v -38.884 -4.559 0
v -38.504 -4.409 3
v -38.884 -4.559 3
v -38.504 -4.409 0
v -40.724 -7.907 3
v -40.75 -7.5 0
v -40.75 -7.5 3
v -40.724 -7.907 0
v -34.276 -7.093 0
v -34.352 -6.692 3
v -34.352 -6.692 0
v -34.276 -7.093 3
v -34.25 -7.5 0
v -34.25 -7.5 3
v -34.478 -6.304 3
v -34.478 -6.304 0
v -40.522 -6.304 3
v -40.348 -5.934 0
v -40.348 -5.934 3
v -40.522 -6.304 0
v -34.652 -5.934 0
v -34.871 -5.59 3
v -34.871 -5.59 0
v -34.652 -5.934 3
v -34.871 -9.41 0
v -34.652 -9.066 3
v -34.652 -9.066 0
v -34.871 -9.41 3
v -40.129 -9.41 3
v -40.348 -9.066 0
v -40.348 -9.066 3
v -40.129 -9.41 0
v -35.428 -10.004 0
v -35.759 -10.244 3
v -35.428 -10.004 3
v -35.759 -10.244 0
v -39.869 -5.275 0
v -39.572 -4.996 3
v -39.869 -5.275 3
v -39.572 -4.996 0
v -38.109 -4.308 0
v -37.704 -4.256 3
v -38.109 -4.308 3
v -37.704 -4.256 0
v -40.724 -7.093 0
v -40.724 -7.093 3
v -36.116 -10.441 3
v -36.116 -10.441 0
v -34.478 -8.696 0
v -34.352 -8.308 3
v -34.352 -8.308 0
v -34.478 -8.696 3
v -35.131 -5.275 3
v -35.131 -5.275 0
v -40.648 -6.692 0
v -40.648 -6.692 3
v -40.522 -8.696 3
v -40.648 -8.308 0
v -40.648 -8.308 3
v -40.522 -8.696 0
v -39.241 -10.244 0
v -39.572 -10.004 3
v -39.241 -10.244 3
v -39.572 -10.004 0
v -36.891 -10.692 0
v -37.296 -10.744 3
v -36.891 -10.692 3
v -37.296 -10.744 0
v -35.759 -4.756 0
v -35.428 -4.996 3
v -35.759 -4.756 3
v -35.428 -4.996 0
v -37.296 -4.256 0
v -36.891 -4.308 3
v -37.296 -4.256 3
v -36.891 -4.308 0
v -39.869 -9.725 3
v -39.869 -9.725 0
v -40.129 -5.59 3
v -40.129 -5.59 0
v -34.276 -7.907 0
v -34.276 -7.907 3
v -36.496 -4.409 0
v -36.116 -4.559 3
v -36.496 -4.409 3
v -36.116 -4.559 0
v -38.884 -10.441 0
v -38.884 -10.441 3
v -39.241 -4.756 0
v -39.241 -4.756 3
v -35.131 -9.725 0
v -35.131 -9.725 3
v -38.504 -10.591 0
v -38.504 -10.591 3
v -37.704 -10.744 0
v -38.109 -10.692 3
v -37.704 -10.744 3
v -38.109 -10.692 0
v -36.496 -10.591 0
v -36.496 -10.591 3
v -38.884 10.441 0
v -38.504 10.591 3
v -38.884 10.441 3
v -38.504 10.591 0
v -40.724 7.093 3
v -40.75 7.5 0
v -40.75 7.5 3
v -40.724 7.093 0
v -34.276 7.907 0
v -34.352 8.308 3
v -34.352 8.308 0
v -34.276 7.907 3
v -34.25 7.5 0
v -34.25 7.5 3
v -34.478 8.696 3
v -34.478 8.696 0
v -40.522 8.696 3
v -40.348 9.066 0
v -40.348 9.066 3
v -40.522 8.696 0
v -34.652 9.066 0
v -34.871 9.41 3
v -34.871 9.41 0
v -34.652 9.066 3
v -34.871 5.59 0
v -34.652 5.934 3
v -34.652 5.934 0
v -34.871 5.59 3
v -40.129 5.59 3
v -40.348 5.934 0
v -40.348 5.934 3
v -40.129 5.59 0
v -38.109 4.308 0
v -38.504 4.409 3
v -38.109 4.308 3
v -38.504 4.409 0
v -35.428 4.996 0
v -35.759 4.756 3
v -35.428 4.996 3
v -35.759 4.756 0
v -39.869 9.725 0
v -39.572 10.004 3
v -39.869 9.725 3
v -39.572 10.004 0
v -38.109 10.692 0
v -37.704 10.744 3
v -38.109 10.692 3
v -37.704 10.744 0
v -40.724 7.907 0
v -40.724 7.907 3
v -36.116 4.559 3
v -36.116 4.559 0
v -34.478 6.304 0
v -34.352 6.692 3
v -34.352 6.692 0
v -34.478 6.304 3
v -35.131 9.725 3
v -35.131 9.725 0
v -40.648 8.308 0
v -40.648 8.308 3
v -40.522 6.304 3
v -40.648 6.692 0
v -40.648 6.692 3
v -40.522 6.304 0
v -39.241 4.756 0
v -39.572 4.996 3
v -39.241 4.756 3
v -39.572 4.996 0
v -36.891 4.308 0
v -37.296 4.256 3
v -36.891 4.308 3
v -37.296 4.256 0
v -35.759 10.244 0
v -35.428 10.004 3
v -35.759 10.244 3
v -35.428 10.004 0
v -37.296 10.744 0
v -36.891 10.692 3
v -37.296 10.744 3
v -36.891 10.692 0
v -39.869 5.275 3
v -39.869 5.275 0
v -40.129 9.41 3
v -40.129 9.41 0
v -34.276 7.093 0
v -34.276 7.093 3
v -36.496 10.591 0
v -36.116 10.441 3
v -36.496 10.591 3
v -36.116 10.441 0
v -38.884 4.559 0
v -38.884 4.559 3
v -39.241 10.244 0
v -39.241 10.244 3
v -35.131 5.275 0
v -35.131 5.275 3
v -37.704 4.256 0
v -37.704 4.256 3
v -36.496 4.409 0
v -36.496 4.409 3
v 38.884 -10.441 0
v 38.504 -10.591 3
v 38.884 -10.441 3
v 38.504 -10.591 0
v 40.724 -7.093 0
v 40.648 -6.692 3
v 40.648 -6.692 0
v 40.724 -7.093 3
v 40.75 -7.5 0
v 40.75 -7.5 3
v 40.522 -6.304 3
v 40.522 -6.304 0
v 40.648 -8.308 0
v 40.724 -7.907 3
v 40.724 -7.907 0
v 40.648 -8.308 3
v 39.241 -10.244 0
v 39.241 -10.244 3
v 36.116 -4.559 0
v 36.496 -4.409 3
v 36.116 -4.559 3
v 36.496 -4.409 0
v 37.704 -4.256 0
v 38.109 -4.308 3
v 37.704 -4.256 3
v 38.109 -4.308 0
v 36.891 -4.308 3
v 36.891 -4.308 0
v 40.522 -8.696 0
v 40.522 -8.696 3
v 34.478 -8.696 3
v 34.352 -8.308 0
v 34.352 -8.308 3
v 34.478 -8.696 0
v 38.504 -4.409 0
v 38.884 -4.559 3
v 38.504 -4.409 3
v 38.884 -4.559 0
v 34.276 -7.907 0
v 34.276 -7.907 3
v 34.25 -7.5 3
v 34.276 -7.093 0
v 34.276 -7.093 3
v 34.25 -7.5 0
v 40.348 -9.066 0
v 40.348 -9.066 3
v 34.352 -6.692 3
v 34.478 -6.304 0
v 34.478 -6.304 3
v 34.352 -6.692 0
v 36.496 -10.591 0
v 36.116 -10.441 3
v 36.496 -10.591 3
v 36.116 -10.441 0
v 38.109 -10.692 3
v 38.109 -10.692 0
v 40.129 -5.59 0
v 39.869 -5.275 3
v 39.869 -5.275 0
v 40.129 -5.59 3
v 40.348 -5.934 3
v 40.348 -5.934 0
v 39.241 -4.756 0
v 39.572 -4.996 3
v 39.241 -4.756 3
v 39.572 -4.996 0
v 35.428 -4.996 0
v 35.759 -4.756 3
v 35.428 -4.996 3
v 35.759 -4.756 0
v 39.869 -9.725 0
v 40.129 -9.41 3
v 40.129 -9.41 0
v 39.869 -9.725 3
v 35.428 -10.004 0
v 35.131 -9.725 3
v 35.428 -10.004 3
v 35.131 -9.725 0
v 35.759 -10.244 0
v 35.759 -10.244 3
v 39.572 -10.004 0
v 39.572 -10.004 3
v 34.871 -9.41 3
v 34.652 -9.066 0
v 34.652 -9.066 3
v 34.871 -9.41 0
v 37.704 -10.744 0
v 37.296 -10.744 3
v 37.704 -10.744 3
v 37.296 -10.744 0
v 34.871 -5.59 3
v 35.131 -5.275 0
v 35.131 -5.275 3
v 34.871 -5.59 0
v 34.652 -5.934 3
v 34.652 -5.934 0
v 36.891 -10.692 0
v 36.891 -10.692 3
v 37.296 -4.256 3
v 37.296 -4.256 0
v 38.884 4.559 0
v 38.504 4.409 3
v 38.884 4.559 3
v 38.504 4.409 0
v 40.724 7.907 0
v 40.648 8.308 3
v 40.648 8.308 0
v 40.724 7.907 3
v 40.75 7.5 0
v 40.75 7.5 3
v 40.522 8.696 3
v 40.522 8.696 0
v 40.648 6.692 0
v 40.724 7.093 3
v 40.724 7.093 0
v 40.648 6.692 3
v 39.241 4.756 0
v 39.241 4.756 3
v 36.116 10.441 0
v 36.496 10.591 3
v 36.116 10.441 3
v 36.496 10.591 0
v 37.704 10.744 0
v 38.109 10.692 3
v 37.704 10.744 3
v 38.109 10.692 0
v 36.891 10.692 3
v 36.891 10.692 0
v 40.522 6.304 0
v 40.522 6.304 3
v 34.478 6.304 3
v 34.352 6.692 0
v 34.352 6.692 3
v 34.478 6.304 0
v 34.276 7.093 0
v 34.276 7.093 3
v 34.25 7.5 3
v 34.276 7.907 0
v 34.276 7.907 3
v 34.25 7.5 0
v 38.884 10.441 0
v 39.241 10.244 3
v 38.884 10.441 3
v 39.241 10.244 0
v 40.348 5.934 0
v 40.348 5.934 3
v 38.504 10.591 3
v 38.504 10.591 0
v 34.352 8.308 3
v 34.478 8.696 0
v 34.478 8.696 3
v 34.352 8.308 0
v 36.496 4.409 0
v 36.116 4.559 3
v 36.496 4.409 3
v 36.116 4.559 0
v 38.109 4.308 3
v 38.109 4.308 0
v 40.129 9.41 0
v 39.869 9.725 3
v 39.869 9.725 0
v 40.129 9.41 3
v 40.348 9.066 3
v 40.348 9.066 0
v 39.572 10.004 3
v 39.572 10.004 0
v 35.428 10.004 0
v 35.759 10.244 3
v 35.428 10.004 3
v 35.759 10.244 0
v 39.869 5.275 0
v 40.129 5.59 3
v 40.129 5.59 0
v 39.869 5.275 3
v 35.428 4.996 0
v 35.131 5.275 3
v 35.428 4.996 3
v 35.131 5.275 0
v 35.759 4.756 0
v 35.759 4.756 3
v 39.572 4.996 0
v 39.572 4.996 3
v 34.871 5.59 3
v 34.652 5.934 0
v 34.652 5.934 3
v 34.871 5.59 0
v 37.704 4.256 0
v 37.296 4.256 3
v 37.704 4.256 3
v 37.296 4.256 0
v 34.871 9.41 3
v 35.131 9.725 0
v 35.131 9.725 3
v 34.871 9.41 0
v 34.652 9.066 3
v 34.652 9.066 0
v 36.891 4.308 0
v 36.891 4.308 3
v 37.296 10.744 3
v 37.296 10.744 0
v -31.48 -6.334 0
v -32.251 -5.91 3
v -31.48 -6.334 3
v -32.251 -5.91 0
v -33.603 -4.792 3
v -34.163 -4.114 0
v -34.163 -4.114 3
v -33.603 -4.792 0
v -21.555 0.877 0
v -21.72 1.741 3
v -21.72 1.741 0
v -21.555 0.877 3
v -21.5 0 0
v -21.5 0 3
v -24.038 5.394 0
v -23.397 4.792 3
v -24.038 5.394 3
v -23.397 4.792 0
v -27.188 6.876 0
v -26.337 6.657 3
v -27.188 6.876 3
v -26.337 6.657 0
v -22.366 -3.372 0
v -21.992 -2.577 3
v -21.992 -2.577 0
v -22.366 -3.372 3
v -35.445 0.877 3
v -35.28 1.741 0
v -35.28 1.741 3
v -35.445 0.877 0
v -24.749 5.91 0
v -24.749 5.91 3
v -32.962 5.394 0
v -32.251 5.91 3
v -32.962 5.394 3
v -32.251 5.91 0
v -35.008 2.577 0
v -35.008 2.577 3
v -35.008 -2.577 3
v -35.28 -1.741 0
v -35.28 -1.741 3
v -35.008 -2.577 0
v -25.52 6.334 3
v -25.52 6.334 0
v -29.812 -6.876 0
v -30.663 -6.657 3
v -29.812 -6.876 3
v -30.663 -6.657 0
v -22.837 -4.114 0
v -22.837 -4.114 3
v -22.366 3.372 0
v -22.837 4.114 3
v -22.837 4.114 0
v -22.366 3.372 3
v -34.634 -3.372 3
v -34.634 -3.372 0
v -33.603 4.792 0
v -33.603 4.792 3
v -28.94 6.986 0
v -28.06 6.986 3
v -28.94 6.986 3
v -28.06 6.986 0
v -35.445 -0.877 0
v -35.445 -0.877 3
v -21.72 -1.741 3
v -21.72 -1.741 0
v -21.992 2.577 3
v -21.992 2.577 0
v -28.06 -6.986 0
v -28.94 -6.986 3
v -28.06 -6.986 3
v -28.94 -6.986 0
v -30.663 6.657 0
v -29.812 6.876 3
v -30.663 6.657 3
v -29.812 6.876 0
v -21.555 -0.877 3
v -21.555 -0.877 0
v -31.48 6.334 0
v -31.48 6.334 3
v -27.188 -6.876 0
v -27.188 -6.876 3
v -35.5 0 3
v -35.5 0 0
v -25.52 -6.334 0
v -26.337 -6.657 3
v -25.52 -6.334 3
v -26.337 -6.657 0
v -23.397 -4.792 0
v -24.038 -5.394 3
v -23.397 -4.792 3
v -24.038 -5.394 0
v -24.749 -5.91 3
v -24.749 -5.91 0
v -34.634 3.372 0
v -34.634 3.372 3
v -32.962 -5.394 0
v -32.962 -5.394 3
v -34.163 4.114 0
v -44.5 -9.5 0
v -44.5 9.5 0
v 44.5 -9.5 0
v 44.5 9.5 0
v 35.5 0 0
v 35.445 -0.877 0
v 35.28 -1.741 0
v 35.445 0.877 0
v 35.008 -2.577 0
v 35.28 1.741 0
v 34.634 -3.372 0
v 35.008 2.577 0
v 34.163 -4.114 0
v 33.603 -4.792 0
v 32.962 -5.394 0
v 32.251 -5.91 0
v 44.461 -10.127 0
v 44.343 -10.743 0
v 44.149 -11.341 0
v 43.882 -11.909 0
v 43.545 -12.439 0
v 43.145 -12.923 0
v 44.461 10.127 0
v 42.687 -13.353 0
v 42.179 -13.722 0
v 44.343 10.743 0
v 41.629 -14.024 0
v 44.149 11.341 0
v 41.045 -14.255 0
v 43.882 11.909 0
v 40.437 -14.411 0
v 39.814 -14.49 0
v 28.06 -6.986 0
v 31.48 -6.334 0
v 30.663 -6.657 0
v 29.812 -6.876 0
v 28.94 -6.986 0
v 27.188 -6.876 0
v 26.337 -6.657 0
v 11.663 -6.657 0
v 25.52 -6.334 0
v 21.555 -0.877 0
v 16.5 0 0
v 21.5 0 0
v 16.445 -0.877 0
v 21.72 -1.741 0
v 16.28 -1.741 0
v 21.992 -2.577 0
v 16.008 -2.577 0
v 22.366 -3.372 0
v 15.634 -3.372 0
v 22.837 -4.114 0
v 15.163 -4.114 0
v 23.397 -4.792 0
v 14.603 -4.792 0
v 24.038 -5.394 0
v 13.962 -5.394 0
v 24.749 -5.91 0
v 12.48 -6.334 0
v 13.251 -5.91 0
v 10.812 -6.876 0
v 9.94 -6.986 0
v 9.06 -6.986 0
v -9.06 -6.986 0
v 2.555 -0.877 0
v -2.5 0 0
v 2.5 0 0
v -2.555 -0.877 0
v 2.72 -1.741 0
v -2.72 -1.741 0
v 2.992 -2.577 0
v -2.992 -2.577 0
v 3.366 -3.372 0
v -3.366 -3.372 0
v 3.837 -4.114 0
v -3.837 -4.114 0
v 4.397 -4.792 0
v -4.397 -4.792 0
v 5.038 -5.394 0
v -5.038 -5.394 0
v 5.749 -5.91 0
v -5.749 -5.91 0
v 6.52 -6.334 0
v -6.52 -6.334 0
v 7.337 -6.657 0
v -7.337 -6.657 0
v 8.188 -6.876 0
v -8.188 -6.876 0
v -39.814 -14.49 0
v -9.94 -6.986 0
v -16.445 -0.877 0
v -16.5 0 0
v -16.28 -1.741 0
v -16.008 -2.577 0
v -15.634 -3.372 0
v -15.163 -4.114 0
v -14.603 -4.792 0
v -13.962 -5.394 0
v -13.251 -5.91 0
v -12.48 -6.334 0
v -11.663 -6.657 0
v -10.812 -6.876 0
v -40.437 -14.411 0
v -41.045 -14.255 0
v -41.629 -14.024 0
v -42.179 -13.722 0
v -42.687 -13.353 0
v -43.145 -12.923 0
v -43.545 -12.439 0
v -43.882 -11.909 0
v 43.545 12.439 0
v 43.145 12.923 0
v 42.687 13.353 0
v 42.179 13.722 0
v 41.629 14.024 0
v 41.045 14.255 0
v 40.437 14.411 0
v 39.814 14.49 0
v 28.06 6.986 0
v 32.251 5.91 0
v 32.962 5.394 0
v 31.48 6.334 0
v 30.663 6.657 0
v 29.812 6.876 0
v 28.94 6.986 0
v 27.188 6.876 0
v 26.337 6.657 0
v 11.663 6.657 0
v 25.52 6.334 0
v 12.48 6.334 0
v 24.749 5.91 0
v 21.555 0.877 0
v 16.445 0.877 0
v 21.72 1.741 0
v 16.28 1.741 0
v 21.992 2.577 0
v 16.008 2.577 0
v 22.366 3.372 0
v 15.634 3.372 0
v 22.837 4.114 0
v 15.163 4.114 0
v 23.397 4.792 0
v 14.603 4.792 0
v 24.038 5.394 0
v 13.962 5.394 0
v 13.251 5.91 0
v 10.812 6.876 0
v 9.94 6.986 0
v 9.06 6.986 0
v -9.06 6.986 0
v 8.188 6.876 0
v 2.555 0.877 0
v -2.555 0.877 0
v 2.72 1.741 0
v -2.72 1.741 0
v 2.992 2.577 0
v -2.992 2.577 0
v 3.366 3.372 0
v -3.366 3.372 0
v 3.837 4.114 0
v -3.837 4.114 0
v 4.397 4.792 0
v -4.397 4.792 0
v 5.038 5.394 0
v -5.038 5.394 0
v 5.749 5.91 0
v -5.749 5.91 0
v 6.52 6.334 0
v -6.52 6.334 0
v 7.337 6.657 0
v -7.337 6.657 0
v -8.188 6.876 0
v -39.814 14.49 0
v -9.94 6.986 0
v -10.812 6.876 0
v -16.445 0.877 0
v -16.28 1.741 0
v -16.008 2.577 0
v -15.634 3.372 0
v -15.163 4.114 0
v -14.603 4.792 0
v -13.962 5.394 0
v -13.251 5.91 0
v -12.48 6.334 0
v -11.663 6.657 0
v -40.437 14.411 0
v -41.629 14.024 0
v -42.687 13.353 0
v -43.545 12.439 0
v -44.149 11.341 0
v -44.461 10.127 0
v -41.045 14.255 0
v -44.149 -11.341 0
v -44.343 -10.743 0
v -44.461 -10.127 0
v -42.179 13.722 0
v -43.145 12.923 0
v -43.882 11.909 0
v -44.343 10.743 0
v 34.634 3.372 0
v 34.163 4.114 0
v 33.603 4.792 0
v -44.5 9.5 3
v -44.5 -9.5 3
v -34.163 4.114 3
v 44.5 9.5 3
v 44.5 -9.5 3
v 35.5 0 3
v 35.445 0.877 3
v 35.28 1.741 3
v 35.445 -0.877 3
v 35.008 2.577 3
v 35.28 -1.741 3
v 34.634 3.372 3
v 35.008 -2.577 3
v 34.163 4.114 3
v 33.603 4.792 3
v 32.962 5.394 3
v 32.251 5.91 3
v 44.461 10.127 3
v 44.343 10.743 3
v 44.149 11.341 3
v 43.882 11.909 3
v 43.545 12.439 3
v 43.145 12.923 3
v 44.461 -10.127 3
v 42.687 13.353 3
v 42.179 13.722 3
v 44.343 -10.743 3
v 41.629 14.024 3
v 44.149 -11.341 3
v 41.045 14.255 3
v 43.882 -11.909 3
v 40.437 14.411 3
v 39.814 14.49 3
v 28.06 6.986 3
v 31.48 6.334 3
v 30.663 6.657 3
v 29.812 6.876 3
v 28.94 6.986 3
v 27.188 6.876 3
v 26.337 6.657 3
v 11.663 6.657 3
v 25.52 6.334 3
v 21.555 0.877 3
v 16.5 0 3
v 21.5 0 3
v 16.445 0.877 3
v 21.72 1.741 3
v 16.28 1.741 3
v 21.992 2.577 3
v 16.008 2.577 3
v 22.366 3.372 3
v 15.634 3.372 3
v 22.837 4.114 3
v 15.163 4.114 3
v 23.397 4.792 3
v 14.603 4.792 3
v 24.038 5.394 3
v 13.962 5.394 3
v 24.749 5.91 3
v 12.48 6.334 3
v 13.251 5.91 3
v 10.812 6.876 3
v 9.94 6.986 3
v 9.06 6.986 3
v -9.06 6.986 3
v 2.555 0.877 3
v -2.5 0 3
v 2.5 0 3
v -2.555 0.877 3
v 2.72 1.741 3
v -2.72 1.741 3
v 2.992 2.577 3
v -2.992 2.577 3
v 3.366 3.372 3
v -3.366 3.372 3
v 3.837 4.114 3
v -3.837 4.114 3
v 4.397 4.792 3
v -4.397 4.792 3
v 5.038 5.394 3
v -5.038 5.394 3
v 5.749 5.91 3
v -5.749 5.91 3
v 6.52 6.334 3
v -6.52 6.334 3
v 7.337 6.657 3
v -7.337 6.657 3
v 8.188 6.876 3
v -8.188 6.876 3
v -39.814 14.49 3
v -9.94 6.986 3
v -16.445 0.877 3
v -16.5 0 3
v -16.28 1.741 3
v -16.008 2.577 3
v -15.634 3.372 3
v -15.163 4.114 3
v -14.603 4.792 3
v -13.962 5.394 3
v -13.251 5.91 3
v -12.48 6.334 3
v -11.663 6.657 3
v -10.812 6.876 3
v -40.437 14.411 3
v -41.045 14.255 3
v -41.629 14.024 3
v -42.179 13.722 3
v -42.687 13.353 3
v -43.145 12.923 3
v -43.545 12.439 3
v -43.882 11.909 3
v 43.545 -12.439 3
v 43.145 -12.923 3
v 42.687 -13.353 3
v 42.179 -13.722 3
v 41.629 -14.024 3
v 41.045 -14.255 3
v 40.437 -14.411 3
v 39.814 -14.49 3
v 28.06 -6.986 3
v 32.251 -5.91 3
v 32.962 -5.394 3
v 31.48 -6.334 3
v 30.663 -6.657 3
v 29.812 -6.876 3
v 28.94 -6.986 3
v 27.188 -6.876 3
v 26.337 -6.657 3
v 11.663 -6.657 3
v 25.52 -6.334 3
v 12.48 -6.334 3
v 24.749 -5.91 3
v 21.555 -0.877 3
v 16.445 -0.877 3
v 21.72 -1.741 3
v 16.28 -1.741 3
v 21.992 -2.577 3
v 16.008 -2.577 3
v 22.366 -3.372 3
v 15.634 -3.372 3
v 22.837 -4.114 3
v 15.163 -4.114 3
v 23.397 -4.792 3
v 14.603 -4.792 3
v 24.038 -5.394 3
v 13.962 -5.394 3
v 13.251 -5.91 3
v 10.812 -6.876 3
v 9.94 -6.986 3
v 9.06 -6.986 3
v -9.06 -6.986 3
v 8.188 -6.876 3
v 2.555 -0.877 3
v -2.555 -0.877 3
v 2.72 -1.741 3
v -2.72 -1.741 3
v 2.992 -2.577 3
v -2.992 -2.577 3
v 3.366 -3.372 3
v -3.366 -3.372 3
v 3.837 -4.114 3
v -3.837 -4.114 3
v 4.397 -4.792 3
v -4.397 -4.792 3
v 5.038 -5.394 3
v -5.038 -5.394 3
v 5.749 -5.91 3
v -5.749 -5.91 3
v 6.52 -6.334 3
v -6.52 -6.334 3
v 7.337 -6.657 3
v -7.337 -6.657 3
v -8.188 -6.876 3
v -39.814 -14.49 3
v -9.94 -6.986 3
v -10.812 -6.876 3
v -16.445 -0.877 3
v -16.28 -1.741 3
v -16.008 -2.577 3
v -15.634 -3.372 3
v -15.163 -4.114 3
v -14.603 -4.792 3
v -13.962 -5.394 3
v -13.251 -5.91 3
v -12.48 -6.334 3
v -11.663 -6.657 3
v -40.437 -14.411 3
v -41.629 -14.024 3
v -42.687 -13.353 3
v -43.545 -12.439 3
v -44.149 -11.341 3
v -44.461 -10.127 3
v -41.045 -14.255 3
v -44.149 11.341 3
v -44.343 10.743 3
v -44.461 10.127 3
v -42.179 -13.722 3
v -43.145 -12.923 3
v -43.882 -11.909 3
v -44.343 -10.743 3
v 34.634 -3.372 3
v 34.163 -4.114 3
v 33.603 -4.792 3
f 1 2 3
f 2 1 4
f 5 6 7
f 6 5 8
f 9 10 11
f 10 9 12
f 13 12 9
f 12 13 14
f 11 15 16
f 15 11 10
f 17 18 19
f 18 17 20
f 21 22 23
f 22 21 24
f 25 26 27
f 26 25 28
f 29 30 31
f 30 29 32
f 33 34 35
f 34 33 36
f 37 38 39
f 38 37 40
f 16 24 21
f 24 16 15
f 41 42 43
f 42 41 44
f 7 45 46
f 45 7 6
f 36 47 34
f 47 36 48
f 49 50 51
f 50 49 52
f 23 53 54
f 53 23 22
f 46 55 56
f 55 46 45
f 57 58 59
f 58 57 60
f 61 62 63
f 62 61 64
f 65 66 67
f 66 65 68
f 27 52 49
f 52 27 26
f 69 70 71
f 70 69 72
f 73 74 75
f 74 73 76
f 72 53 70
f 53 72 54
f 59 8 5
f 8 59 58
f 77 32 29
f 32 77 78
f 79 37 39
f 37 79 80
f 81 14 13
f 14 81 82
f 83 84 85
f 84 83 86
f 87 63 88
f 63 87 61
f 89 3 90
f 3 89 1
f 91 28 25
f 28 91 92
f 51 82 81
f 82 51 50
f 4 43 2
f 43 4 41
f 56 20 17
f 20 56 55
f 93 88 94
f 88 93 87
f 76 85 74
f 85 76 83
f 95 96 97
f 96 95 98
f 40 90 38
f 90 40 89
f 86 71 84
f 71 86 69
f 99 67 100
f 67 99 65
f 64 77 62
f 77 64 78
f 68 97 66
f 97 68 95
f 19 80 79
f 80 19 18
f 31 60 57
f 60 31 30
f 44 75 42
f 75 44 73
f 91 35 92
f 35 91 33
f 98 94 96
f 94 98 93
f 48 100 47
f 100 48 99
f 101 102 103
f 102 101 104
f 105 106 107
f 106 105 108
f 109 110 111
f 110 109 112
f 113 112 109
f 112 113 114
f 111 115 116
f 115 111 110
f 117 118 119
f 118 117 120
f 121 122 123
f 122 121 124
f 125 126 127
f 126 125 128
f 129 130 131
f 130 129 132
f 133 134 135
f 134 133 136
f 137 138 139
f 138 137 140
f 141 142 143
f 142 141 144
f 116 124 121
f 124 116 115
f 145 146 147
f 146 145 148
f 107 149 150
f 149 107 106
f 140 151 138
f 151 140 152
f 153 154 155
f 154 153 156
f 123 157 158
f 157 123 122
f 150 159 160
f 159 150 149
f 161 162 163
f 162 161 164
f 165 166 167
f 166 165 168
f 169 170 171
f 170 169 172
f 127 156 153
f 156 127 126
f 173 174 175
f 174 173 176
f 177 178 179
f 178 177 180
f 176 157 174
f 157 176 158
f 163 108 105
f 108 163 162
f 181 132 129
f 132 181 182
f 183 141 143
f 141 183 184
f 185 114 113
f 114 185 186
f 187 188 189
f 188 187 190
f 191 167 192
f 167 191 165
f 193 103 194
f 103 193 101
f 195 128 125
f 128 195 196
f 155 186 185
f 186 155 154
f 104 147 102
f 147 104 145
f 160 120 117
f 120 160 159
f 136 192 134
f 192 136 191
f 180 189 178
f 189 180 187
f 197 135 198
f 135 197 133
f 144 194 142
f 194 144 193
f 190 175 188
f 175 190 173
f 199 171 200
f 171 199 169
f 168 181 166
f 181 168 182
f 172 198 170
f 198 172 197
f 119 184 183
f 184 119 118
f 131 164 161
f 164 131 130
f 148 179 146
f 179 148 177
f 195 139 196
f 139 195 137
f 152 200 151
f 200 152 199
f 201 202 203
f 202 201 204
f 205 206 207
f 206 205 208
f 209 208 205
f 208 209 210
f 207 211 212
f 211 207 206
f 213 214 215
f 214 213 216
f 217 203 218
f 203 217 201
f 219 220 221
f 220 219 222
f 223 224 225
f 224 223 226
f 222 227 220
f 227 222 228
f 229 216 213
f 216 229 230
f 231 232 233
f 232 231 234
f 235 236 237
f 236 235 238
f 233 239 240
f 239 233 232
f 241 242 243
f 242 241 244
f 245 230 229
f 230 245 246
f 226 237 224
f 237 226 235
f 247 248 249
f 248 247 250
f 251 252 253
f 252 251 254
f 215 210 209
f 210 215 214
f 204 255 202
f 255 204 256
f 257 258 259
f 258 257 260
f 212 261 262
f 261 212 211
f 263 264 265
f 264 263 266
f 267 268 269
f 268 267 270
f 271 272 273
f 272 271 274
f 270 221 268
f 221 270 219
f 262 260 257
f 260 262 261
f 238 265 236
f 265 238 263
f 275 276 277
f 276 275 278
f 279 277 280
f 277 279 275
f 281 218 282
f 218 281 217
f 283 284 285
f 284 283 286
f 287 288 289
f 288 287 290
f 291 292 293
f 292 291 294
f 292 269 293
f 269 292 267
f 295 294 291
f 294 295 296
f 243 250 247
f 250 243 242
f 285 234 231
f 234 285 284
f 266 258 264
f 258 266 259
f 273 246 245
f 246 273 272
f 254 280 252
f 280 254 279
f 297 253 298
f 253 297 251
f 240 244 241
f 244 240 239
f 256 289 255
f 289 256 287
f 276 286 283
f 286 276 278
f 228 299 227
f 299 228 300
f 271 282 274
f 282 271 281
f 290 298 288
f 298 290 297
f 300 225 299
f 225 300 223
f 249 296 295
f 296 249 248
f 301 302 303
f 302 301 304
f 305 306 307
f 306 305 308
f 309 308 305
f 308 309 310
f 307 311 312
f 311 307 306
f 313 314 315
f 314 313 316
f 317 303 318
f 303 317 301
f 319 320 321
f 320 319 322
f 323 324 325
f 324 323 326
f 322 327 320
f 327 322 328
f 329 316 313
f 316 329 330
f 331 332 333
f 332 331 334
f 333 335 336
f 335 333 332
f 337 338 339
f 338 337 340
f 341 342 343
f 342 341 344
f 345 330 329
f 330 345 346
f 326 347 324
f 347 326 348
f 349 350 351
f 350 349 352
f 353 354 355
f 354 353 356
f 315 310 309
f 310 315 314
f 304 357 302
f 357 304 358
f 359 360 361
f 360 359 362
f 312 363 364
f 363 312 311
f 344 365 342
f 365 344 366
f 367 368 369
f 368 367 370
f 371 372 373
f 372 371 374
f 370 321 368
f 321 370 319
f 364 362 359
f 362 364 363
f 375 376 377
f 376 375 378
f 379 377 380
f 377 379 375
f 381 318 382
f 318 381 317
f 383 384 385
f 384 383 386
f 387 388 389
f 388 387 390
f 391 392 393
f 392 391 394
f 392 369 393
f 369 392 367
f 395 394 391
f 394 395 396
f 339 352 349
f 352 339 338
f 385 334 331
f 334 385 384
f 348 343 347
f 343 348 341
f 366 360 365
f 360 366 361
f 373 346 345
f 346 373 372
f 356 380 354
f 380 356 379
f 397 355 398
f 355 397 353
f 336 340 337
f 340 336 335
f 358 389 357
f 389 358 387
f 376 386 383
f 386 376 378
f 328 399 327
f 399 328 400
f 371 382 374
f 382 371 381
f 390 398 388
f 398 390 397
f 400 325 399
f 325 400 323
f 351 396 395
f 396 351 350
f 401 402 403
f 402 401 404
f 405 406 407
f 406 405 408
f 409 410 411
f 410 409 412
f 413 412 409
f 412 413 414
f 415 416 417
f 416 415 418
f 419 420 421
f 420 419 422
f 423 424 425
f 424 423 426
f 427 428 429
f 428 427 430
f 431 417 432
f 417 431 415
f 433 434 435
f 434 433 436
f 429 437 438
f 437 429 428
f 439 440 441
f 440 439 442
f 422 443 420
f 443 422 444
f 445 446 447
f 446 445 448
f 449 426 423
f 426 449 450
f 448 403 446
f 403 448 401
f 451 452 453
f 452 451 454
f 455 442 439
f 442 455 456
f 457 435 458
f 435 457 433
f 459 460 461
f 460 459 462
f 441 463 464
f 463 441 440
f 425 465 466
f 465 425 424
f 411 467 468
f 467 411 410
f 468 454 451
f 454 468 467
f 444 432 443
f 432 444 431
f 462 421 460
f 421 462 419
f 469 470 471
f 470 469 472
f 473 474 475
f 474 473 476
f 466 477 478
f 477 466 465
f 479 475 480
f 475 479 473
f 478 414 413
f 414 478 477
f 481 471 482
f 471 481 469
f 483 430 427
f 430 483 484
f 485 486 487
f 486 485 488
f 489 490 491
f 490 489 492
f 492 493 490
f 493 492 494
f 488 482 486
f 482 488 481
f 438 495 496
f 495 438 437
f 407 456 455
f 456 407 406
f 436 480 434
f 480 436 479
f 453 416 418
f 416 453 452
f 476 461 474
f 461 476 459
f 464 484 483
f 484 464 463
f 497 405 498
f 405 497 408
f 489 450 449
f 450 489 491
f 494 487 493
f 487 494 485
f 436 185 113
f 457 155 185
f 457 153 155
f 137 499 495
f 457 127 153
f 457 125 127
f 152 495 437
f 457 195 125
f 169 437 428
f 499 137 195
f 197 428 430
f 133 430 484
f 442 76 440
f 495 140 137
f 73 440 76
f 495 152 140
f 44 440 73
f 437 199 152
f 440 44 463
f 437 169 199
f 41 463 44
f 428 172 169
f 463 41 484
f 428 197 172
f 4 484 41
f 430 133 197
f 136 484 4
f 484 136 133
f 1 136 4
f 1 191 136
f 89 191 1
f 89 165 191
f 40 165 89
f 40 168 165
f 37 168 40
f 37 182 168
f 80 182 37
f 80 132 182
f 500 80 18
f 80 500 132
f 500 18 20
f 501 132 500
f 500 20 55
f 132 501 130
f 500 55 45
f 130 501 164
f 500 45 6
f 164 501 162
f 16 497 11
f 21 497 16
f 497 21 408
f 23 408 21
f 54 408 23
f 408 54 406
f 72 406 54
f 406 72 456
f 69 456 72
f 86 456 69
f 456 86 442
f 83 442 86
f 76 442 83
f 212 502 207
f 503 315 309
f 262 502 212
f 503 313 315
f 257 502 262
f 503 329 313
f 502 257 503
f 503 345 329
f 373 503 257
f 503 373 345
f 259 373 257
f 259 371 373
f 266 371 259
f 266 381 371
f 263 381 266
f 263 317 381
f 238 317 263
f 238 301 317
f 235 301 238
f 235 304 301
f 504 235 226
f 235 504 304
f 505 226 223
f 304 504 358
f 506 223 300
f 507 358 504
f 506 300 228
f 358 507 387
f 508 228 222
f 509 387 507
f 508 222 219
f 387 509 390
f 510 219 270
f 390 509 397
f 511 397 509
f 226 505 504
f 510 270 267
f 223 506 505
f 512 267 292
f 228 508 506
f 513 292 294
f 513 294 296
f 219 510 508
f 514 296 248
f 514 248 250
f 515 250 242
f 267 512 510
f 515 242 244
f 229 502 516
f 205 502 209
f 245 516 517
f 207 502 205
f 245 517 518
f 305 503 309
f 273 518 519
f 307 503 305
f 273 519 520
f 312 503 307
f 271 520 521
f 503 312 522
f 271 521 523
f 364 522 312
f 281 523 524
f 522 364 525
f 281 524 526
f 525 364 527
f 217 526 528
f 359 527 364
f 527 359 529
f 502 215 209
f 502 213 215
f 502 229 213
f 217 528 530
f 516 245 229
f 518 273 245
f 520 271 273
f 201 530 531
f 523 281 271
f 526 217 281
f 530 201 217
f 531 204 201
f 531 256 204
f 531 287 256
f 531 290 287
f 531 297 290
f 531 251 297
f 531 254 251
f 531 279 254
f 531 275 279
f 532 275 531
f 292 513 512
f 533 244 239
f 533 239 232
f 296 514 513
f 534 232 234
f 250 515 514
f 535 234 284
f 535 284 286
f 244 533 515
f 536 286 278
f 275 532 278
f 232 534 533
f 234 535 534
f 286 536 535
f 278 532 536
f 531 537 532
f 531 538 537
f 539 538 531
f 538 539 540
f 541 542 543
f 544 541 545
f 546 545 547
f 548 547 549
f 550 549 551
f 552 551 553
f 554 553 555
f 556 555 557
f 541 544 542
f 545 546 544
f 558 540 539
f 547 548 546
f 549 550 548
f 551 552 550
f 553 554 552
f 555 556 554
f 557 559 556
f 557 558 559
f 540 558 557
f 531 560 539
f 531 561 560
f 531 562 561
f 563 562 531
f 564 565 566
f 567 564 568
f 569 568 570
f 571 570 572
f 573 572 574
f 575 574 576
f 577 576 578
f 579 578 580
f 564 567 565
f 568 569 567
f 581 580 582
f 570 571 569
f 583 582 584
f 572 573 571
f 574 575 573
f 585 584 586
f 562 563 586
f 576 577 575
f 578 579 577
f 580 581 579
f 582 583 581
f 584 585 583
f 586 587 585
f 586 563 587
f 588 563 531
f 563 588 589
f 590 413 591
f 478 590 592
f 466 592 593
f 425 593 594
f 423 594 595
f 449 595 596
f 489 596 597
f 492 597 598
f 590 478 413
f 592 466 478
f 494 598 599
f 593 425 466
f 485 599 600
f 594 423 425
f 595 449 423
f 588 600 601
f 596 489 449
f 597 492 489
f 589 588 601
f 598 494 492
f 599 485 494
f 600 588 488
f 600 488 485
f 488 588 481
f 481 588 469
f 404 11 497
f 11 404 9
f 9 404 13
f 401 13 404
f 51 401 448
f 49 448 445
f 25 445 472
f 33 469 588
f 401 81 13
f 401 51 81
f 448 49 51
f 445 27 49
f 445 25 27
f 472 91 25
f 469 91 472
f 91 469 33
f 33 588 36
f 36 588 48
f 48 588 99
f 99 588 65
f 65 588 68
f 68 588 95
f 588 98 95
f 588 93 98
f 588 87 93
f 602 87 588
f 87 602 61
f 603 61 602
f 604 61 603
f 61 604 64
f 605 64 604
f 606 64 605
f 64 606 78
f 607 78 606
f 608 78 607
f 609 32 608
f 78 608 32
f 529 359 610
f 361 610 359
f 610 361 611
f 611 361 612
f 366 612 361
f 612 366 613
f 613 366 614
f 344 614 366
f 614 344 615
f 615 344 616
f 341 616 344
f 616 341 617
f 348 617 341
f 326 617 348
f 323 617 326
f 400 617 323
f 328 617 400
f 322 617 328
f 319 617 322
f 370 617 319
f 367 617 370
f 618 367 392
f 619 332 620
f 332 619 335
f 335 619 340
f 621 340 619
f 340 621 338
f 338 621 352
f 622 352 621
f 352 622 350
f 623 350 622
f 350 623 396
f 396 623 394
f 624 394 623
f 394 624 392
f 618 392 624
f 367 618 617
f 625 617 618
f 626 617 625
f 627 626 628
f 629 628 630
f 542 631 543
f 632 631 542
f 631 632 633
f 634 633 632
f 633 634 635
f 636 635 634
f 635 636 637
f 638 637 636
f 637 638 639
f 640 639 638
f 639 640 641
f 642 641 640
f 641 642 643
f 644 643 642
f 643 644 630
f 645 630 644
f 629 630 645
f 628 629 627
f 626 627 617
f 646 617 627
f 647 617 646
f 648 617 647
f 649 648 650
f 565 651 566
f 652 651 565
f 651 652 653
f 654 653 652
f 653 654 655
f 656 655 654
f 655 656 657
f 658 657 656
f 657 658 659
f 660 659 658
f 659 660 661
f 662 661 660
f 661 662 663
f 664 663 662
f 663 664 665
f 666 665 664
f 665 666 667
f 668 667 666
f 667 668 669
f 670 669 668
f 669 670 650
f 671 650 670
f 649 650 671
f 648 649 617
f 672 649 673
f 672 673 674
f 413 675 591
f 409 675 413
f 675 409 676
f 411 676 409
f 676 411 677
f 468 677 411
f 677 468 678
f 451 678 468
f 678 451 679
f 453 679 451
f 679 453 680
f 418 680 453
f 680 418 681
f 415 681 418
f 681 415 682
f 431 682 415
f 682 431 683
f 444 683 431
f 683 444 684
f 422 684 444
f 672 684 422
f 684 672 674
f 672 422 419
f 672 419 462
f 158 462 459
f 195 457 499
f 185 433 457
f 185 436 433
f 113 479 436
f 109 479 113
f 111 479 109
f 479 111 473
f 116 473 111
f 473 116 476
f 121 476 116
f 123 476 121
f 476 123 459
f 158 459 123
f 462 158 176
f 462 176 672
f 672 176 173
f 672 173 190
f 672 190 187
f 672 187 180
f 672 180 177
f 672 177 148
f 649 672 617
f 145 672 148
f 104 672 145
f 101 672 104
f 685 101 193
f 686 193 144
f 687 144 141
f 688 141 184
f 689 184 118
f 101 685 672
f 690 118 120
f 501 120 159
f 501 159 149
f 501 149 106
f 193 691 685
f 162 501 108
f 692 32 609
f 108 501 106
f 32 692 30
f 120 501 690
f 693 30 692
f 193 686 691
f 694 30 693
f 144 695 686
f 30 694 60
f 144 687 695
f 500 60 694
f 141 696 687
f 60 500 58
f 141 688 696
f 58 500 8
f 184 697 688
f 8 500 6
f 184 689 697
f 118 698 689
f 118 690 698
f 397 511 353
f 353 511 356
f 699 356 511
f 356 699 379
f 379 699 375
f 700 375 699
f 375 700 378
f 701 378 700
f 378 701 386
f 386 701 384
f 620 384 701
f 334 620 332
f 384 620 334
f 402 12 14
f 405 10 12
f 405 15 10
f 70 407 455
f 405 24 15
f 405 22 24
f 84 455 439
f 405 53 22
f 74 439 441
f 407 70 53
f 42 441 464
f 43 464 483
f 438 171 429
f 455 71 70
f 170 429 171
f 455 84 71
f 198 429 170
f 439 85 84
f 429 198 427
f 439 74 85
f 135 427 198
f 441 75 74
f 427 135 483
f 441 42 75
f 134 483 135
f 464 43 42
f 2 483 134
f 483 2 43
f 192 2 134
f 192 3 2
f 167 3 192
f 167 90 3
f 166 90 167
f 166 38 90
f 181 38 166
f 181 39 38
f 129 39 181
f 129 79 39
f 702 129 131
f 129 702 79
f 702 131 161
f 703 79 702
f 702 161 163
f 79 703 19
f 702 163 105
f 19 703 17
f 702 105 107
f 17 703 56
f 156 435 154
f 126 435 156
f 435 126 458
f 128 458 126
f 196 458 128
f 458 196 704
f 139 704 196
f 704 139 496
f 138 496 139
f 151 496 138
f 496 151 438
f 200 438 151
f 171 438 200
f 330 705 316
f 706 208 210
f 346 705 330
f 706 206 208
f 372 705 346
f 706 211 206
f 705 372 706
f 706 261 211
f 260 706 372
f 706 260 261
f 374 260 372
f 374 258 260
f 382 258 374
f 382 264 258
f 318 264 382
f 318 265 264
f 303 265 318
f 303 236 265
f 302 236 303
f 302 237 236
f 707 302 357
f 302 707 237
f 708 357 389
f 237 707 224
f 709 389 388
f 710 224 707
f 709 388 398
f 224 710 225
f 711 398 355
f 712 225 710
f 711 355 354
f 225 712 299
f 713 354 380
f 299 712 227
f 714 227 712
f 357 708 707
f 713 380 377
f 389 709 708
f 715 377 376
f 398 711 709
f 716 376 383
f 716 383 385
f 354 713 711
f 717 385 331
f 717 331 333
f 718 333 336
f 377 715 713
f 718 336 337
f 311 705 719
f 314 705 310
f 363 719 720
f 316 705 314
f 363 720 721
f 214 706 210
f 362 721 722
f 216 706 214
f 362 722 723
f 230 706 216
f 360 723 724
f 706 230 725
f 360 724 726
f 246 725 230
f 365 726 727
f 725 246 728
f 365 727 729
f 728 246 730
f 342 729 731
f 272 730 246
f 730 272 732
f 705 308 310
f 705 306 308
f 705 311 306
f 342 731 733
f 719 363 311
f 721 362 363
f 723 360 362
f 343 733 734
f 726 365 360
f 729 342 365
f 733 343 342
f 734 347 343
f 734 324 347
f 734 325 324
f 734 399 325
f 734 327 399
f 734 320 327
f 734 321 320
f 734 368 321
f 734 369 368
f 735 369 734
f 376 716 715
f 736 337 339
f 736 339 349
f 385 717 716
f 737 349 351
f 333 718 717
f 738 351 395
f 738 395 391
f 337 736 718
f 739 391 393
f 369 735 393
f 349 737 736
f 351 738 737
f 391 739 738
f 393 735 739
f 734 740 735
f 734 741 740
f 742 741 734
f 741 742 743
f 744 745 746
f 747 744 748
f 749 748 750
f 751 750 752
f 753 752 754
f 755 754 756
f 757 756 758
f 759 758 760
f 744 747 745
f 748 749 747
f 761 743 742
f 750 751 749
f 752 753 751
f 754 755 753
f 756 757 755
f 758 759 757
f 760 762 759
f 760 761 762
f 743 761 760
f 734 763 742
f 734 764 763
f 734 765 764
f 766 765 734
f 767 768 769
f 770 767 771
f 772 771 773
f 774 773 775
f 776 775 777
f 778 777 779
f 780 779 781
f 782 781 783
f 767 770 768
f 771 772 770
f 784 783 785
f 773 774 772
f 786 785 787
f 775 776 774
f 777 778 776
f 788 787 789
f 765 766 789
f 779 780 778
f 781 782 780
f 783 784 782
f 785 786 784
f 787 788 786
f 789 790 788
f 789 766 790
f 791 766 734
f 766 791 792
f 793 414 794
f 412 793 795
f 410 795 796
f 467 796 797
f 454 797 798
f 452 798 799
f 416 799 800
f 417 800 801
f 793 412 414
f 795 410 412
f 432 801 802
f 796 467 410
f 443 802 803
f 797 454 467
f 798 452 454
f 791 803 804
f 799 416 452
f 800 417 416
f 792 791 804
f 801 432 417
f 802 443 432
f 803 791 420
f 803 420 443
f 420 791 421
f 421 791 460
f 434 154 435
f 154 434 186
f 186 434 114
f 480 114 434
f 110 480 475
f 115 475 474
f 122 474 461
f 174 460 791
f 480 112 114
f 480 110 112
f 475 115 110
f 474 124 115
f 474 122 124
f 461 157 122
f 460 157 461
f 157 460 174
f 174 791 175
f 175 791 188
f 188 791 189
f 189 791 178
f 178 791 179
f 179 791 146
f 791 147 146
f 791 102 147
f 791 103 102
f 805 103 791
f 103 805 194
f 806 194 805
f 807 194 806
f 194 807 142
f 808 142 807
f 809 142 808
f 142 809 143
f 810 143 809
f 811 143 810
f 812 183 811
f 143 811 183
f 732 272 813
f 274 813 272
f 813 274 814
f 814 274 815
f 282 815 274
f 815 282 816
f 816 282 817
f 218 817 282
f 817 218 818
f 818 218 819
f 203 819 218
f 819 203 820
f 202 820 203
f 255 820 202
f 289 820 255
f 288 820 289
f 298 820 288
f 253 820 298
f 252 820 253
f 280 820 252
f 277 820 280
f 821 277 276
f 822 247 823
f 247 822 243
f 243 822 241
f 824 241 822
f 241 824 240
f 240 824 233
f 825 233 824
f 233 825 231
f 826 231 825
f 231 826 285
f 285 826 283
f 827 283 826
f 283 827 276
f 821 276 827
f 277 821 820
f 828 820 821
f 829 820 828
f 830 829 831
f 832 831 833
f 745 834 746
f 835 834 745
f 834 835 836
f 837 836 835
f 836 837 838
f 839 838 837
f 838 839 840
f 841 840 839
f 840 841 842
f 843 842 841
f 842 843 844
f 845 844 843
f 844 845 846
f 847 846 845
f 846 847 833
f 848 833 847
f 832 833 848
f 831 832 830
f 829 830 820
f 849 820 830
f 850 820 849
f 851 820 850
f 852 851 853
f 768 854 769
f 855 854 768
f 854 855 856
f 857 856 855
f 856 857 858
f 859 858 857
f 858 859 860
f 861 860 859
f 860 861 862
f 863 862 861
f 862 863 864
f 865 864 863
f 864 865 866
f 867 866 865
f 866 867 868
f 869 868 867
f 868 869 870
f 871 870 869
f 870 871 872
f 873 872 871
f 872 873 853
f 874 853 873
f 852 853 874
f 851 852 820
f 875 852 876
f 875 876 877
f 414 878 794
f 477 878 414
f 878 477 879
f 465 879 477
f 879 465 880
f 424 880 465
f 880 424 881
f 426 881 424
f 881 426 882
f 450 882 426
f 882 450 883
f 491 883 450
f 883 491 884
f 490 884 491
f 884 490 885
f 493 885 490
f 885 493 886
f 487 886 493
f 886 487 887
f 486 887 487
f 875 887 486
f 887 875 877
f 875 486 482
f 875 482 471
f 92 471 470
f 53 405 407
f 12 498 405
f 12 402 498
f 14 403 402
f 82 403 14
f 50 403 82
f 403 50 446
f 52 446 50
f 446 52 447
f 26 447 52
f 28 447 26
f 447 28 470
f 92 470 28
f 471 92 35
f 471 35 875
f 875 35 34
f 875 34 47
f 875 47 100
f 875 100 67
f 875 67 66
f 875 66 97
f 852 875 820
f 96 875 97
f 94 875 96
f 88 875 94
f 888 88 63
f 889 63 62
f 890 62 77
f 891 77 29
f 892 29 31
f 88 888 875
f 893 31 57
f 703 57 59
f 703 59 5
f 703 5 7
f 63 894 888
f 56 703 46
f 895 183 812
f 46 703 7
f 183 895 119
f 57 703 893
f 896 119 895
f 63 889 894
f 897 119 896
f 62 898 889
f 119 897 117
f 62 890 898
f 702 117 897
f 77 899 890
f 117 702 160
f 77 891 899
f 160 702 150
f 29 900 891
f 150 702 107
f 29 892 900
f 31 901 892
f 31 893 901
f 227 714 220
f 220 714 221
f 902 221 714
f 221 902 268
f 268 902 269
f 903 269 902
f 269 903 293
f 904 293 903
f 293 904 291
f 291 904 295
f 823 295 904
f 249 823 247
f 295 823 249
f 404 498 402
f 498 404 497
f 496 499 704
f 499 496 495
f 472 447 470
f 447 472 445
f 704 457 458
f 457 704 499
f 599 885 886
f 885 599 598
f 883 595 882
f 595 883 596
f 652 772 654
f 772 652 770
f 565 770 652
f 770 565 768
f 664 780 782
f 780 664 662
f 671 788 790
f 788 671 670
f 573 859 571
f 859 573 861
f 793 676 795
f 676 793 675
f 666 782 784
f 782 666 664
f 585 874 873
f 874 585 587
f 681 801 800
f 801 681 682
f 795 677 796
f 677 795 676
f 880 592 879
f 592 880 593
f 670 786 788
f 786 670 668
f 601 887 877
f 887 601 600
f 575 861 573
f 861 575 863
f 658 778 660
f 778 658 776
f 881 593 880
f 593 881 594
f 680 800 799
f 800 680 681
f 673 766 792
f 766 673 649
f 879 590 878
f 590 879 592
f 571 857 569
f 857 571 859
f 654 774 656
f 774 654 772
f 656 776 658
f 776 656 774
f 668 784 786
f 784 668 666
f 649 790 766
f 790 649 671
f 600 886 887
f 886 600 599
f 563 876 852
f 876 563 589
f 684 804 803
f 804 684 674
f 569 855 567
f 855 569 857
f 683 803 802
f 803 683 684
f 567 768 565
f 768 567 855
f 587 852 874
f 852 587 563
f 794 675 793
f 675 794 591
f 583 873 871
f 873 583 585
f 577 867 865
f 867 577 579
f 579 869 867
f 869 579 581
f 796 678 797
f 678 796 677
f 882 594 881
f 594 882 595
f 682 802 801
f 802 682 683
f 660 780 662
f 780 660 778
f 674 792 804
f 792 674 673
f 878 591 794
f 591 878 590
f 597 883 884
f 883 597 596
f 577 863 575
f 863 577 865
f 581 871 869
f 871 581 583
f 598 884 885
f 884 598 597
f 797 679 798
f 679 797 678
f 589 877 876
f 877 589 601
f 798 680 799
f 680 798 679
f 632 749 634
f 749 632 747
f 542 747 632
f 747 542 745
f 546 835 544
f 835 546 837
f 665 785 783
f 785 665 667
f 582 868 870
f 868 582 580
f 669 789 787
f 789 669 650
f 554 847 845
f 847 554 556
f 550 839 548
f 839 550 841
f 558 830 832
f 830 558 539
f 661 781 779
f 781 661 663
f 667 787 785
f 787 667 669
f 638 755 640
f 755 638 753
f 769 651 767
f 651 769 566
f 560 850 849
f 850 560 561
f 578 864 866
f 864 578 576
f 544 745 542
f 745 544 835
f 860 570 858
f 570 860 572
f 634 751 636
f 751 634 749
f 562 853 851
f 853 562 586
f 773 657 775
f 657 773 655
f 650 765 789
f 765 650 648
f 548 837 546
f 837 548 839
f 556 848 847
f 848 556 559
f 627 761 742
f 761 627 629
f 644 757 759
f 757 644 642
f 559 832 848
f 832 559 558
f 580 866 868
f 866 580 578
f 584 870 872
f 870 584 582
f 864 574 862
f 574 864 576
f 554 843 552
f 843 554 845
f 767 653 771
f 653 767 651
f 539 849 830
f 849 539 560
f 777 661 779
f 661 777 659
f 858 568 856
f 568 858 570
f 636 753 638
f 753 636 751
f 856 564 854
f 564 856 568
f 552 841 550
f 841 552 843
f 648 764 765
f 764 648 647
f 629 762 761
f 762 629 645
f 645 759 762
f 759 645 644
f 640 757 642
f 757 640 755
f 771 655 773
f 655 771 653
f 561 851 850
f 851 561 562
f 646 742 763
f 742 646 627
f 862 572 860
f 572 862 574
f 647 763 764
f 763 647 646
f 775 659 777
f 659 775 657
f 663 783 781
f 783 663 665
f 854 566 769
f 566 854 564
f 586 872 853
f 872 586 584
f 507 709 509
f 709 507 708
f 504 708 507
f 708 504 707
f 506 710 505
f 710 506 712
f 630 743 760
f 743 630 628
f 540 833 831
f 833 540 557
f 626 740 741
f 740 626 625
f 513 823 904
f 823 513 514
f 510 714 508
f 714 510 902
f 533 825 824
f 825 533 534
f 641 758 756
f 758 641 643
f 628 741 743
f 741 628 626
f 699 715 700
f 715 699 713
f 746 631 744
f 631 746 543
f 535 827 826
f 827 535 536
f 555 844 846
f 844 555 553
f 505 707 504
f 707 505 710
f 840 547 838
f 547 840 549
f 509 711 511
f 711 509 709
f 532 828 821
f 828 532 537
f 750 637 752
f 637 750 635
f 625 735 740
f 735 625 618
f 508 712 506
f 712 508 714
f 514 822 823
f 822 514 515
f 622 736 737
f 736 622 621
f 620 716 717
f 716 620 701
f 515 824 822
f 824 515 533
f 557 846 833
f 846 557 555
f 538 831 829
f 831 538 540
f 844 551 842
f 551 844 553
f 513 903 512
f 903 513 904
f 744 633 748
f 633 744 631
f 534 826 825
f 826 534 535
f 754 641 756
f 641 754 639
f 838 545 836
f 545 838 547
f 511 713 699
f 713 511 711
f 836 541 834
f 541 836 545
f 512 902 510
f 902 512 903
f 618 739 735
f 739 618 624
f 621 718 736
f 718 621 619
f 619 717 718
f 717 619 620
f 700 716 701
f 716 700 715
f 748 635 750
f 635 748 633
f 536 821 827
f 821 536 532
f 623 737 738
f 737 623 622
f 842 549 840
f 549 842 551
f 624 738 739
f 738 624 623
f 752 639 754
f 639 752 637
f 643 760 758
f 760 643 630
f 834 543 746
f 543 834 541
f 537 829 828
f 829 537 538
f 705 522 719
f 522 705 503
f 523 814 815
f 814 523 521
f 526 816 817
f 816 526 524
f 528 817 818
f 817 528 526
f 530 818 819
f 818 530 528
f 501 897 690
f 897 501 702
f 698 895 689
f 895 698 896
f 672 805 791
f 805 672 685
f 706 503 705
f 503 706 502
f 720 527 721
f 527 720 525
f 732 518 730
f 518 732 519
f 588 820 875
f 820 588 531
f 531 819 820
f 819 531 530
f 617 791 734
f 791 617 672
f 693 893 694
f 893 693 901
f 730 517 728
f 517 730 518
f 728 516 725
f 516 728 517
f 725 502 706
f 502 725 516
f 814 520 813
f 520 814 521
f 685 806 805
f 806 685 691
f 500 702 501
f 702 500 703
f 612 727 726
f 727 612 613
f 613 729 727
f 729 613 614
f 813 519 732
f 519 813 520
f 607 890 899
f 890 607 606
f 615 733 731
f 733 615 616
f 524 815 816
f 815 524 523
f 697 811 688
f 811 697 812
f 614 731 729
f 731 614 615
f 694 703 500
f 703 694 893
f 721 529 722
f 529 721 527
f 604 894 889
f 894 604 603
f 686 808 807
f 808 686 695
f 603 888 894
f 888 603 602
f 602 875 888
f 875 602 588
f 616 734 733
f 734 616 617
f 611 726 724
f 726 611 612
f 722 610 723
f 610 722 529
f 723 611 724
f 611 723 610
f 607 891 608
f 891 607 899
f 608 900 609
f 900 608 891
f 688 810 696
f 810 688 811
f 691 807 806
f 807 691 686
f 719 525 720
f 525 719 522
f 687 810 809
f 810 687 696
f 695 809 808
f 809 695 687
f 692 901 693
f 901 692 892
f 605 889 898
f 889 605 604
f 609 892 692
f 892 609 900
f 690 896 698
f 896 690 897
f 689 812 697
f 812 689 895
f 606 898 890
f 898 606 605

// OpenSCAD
$fn = 50;


difference() {
	union() {
		hull() {
			translate(v = [-39.5000000000, 9.5000000000, 0]) {
				cylinder(h = 3, r = 5);
			}
			translate(v = [39.5000000000, 9.5000000000, 0]) {
				cylinder(h = 3, r = 5);
			}
			translate(v = [-39.5000000000, -9.5000000000, 0]) {
				cylinder(h = 3, r = 5);
			}
			translate(v = [39.5000000000, -9.5000000000, 0]) {
				cylinder(h = 3, r = 5);
			}
		}
	}
	union() {
		#translate(v = [-37.5000000000, -7.5000000000, -100.0000000000]) {
			cylinder(h = 200, r = 3.2500000000);
		}
		#translate(v = [-37.5000000000, 7.5000000000, -100.0000000000]) {
			cylinder(h = 200, r = 3.2500000000);
		}
		#translate(v = [37.5000000000, -7.5000000000, -100.0000000000]) {
			cylinder(h = 200, r = 3.2500000000);
		}
		#translate(v = [37.5000000000, 7.5000000000, -100.0000000000]) {
			cylinder(h = 200, r = 3.2500000000);
		}
		#translate(v = [-28.5000000000, 0, 0]) {
			cylinder(h = 3, r = 7.0000000000);
		}
		#translate(v = [-9.5000000000, 0, 0]) {
			cylinder(h = 3, r = 7.0000000000);
		}
		#translate(v = [9.5000000000, 0, 0]) {
			cylinder(h = 3, r = 7.0000000000);
		}
		#translate(v = [28.5000000000, 0, 0]) {
			cylinder(h = 3, r = 7.0000000000);
		}
	}
}
